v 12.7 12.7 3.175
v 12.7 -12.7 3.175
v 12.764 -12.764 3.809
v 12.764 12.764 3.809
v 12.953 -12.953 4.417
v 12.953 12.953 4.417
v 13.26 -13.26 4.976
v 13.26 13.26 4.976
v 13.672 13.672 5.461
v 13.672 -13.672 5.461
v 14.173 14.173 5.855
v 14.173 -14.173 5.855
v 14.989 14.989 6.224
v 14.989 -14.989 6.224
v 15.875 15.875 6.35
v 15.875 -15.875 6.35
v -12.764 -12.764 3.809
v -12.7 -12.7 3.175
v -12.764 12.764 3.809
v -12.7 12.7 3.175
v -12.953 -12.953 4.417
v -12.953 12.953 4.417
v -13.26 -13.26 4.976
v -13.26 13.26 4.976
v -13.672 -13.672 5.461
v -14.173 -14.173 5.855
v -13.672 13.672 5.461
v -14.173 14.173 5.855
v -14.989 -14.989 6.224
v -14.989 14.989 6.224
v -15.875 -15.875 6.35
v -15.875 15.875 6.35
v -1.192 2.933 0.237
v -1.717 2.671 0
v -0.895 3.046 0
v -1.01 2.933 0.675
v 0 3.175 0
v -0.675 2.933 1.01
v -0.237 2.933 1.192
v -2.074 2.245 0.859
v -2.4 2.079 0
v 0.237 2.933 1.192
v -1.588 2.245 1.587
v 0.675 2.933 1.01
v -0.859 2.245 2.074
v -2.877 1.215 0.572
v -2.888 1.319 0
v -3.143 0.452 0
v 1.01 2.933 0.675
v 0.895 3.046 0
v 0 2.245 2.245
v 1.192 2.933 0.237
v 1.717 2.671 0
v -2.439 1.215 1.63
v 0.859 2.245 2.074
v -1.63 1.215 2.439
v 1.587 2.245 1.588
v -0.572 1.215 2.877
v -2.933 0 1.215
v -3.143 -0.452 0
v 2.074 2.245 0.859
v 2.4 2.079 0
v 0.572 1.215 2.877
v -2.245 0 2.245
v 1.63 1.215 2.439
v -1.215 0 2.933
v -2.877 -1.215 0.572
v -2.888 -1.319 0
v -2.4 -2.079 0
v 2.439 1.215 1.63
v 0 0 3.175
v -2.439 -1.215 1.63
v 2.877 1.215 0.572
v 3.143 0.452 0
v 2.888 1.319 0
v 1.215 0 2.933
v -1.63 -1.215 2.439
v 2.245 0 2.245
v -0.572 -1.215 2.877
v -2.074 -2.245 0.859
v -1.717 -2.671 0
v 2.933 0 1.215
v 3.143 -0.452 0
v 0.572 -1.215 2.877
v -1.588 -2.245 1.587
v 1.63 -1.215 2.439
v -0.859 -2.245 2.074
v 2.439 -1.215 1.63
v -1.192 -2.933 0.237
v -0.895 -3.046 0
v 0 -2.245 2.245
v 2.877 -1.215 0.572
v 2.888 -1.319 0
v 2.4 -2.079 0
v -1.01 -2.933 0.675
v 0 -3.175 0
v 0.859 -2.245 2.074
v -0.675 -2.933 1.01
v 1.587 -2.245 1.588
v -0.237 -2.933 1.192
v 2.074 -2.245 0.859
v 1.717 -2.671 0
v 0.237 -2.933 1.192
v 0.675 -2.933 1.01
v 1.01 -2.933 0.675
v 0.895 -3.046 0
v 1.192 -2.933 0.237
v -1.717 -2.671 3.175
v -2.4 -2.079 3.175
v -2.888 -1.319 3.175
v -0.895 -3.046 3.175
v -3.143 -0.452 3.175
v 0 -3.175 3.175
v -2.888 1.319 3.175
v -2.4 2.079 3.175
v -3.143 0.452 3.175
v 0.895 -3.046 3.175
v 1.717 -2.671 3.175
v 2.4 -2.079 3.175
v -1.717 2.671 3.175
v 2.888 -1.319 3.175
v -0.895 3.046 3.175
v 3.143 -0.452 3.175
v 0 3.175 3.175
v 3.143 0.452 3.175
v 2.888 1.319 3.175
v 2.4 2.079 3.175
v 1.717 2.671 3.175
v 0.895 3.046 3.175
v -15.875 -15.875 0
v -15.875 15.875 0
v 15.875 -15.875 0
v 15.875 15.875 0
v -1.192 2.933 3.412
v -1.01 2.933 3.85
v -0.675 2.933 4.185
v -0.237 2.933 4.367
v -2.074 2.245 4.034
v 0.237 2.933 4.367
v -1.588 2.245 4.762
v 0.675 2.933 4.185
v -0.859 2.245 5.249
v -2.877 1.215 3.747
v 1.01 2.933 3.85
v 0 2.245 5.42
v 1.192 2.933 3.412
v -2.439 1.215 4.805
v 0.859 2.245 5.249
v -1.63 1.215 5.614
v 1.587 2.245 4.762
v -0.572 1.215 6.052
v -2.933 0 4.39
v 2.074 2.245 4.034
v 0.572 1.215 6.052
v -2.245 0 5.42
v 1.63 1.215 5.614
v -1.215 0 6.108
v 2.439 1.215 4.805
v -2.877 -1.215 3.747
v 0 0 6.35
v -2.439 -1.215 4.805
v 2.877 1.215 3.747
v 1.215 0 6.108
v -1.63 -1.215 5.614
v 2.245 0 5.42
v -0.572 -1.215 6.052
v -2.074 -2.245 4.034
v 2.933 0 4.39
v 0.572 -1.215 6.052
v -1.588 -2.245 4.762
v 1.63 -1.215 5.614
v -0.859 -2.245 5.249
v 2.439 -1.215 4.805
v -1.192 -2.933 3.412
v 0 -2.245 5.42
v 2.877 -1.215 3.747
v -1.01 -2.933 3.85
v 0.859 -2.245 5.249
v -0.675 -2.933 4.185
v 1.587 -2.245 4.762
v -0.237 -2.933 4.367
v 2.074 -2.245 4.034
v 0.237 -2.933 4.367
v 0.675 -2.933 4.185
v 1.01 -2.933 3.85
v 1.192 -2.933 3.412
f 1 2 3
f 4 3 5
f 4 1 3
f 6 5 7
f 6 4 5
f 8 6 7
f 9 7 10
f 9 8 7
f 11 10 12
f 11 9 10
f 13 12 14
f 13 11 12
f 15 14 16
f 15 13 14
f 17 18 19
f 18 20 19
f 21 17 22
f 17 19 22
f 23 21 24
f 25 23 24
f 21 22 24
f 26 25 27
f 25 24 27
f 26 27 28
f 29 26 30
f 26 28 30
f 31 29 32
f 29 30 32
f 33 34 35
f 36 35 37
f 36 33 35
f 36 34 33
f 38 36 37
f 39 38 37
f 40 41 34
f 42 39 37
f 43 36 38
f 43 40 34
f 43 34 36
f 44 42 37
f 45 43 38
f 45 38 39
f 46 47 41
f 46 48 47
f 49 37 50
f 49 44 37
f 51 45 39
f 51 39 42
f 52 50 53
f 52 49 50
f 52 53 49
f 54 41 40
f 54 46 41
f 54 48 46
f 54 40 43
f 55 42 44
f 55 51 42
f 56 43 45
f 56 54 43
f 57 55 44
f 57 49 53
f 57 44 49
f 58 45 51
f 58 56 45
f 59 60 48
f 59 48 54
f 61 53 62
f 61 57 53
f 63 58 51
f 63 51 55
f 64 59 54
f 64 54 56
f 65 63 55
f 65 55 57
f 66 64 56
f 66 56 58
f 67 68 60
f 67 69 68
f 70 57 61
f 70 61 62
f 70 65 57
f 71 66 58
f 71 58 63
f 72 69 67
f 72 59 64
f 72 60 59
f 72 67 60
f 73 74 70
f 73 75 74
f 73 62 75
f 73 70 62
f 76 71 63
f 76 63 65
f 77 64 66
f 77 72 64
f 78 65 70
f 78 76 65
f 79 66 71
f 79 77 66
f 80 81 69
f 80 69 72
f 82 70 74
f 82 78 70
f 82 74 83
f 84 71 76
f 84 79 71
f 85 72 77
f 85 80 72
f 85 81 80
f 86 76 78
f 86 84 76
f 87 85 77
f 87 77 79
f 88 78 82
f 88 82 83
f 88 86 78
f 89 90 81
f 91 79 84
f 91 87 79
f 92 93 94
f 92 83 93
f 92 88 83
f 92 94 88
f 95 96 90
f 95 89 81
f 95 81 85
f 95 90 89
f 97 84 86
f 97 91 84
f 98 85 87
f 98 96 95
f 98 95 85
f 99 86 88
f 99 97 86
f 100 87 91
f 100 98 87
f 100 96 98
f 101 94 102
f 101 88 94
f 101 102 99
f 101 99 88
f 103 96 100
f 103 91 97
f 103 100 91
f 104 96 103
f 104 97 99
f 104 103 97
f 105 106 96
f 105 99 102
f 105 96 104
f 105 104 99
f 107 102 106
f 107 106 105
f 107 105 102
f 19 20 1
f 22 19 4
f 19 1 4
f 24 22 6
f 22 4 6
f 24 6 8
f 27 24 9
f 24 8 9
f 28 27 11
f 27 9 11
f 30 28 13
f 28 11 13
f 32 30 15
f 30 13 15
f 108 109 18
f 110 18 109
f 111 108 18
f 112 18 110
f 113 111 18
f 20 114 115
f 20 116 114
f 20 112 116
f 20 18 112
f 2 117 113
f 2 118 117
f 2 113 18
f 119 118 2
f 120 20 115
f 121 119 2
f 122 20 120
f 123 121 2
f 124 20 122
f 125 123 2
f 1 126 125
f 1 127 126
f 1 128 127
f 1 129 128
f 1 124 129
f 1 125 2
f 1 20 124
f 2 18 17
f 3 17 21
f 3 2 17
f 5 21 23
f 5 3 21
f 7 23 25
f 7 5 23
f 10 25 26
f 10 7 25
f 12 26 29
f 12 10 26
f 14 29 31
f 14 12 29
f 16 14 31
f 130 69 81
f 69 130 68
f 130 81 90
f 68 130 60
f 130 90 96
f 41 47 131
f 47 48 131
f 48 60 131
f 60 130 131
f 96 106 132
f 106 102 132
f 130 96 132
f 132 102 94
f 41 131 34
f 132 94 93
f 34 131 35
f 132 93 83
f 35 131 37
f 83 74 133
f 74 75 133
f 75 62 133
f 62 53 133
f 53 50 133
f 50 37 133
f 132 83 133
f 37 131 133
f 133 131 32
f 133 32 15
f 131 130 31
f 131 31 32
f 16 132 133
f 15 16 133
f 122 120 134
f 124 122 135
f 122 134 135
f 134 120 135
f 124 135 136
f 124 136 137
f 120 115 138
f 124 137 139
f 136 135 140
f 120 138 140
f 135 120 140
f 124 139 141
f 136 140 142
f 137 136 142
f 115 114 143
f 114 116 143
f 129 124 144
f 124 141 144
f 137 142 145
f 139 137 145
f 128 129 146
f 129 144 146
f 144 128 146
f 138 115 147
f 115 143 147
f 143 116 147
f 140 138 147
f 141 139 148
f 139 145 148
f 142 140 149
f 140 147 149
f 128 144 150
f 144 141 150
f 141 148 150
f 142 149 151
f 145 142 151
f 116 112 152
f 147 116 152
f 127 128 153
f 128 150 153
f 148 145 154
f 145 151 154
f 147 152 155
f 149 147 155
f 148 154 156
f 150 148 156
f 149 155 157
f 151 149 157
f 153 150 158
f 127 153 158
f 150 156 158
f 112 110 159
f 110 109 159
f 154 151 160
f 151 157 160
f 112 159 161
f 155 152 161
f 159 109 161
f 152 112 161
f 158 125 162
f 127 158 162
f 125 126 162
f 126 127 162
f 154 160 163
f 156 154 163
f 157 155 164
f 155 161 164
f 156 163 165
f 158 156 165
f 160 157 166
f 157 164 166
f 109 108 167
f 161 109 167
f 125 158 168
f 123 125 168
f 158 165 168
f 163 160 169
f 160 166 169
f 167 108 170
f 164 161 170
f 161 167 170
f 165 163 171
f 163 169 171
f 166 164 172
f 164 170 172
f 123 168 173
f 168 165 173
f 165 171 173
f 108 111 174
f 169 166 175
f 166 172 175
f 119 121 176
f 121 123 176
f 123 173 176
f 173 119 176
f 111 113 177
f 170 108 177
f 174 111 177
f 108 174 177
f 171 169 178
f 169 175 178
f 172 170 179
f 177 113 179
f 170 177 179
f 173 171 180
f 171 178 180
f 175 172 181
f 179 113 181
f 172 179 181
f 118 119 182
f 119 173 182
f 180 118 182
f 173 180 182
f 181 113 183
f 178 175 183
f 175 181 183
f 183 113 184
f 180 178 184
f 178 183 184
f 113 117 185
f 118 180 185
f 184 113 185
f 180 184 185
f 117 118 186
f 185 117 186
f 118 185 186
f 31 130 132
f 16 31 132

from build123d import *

# Parameters (mm, degrees)
F0_W     = 31.75
F0_H     = 31.75
F0_W_2   = 25.4
F0_H_2   = 25.4
F1_DEPTH = 3.175
F2_DEPTH = 6.35
F6_R     = 3.17499


# Not quite as in the source:
# - a fillet or chamfer is up to 0.001 mm smaller than in the source, because OpenCascade refuses the exact size


with BuildPart() as f1:
    # F0 (on Top) → F1 (new body)
    with BuildSketch(Plane.XY):
        Rectangle(F0_W, F0_H)
        Rectangle(F0_W_2, F0_H_2, mode=Mode.SUBTRACT)
        Rectangle(F0_W_2, F0_H_2)
        with BuildLine():
            ThreePointArc((0, 3.175), (2.2450640303, 2.2450640303), (3.175, 0))
            ThreePointArc((3.175, 0), (2.2450640303, -2.2450640303), (0, -3.175))
            ThreePointArc((0, -3.175), (-3.175, 0), (0, 3.175))
        make_face(mode=Mode.SUBTRACT)
        with BuildLine():
            ThreePointArc((0, -3.175), (2.2450640303, -2.2450640303), (3.175, 0))
            ThreePointArc((3.175, 0), (2.2450640303, 2.2450640303), (0, 3.175))
            Line((0, 3.175), (0, -3.175))
        make_face()
        with BuildLine():
            Line((0, -3.175), (0, 3.175))
            ThreePointArc((0, 3.175), (-3.175, 0), (0, -3.175))
        make_face()
    extrude(amount=F1_DEPTH)

    # F0 (on Top) → F2 (join)
    with BuildSketch(Plane.XY):
        Rectangle(F0_W, F0_H)
        Rectangle(F0_W_2, F0_H_2, mode=Mode.SUBTRACT)
    extrude(amount=F2_DEPTH)

    # F3 (on face) → F4 (revolve)
    with BuildSketch(Plane.XY.offset(3.175)):
        with BuildLine():
            Line((0, -3.175), (0, 3.175))
            ThreePointArc((0, 3.175), (-3.175, 0), (0, -3.175))
        make_face()
    revolve(axis=Axis((0, 0, 3.175), (0, 1, 0)))

    # F0 (on Top) → F5 (revolve, cut)
    with BuildSketch(Plane.XY):
        with BuildLine():
            Line((0, -3.175), (0, 3.175))
            ThreePointArc((0, 3.175), (-3.175, 0), (0, -3.175))
        make_face()
    revolve(axis=Axis((0, 0, 0), (0, 1, 0)), mode=Mode.SUBTRACT)

    # F6 (radius 3.175 in the source; OpenCascade refuses exactly that, so slightly less here)
    f6_edges = [f1.edges().sort_by_distance(p)[0] for p in [
        (0, 12.7, 6.35),
        (12.7, 0, 6.35),
        (-12.7, 0, 6.35),
        (0, -12.7, 6.35),
    ]]
    fillet(f6_edges, radius=F6_R)


solid = f1.part
